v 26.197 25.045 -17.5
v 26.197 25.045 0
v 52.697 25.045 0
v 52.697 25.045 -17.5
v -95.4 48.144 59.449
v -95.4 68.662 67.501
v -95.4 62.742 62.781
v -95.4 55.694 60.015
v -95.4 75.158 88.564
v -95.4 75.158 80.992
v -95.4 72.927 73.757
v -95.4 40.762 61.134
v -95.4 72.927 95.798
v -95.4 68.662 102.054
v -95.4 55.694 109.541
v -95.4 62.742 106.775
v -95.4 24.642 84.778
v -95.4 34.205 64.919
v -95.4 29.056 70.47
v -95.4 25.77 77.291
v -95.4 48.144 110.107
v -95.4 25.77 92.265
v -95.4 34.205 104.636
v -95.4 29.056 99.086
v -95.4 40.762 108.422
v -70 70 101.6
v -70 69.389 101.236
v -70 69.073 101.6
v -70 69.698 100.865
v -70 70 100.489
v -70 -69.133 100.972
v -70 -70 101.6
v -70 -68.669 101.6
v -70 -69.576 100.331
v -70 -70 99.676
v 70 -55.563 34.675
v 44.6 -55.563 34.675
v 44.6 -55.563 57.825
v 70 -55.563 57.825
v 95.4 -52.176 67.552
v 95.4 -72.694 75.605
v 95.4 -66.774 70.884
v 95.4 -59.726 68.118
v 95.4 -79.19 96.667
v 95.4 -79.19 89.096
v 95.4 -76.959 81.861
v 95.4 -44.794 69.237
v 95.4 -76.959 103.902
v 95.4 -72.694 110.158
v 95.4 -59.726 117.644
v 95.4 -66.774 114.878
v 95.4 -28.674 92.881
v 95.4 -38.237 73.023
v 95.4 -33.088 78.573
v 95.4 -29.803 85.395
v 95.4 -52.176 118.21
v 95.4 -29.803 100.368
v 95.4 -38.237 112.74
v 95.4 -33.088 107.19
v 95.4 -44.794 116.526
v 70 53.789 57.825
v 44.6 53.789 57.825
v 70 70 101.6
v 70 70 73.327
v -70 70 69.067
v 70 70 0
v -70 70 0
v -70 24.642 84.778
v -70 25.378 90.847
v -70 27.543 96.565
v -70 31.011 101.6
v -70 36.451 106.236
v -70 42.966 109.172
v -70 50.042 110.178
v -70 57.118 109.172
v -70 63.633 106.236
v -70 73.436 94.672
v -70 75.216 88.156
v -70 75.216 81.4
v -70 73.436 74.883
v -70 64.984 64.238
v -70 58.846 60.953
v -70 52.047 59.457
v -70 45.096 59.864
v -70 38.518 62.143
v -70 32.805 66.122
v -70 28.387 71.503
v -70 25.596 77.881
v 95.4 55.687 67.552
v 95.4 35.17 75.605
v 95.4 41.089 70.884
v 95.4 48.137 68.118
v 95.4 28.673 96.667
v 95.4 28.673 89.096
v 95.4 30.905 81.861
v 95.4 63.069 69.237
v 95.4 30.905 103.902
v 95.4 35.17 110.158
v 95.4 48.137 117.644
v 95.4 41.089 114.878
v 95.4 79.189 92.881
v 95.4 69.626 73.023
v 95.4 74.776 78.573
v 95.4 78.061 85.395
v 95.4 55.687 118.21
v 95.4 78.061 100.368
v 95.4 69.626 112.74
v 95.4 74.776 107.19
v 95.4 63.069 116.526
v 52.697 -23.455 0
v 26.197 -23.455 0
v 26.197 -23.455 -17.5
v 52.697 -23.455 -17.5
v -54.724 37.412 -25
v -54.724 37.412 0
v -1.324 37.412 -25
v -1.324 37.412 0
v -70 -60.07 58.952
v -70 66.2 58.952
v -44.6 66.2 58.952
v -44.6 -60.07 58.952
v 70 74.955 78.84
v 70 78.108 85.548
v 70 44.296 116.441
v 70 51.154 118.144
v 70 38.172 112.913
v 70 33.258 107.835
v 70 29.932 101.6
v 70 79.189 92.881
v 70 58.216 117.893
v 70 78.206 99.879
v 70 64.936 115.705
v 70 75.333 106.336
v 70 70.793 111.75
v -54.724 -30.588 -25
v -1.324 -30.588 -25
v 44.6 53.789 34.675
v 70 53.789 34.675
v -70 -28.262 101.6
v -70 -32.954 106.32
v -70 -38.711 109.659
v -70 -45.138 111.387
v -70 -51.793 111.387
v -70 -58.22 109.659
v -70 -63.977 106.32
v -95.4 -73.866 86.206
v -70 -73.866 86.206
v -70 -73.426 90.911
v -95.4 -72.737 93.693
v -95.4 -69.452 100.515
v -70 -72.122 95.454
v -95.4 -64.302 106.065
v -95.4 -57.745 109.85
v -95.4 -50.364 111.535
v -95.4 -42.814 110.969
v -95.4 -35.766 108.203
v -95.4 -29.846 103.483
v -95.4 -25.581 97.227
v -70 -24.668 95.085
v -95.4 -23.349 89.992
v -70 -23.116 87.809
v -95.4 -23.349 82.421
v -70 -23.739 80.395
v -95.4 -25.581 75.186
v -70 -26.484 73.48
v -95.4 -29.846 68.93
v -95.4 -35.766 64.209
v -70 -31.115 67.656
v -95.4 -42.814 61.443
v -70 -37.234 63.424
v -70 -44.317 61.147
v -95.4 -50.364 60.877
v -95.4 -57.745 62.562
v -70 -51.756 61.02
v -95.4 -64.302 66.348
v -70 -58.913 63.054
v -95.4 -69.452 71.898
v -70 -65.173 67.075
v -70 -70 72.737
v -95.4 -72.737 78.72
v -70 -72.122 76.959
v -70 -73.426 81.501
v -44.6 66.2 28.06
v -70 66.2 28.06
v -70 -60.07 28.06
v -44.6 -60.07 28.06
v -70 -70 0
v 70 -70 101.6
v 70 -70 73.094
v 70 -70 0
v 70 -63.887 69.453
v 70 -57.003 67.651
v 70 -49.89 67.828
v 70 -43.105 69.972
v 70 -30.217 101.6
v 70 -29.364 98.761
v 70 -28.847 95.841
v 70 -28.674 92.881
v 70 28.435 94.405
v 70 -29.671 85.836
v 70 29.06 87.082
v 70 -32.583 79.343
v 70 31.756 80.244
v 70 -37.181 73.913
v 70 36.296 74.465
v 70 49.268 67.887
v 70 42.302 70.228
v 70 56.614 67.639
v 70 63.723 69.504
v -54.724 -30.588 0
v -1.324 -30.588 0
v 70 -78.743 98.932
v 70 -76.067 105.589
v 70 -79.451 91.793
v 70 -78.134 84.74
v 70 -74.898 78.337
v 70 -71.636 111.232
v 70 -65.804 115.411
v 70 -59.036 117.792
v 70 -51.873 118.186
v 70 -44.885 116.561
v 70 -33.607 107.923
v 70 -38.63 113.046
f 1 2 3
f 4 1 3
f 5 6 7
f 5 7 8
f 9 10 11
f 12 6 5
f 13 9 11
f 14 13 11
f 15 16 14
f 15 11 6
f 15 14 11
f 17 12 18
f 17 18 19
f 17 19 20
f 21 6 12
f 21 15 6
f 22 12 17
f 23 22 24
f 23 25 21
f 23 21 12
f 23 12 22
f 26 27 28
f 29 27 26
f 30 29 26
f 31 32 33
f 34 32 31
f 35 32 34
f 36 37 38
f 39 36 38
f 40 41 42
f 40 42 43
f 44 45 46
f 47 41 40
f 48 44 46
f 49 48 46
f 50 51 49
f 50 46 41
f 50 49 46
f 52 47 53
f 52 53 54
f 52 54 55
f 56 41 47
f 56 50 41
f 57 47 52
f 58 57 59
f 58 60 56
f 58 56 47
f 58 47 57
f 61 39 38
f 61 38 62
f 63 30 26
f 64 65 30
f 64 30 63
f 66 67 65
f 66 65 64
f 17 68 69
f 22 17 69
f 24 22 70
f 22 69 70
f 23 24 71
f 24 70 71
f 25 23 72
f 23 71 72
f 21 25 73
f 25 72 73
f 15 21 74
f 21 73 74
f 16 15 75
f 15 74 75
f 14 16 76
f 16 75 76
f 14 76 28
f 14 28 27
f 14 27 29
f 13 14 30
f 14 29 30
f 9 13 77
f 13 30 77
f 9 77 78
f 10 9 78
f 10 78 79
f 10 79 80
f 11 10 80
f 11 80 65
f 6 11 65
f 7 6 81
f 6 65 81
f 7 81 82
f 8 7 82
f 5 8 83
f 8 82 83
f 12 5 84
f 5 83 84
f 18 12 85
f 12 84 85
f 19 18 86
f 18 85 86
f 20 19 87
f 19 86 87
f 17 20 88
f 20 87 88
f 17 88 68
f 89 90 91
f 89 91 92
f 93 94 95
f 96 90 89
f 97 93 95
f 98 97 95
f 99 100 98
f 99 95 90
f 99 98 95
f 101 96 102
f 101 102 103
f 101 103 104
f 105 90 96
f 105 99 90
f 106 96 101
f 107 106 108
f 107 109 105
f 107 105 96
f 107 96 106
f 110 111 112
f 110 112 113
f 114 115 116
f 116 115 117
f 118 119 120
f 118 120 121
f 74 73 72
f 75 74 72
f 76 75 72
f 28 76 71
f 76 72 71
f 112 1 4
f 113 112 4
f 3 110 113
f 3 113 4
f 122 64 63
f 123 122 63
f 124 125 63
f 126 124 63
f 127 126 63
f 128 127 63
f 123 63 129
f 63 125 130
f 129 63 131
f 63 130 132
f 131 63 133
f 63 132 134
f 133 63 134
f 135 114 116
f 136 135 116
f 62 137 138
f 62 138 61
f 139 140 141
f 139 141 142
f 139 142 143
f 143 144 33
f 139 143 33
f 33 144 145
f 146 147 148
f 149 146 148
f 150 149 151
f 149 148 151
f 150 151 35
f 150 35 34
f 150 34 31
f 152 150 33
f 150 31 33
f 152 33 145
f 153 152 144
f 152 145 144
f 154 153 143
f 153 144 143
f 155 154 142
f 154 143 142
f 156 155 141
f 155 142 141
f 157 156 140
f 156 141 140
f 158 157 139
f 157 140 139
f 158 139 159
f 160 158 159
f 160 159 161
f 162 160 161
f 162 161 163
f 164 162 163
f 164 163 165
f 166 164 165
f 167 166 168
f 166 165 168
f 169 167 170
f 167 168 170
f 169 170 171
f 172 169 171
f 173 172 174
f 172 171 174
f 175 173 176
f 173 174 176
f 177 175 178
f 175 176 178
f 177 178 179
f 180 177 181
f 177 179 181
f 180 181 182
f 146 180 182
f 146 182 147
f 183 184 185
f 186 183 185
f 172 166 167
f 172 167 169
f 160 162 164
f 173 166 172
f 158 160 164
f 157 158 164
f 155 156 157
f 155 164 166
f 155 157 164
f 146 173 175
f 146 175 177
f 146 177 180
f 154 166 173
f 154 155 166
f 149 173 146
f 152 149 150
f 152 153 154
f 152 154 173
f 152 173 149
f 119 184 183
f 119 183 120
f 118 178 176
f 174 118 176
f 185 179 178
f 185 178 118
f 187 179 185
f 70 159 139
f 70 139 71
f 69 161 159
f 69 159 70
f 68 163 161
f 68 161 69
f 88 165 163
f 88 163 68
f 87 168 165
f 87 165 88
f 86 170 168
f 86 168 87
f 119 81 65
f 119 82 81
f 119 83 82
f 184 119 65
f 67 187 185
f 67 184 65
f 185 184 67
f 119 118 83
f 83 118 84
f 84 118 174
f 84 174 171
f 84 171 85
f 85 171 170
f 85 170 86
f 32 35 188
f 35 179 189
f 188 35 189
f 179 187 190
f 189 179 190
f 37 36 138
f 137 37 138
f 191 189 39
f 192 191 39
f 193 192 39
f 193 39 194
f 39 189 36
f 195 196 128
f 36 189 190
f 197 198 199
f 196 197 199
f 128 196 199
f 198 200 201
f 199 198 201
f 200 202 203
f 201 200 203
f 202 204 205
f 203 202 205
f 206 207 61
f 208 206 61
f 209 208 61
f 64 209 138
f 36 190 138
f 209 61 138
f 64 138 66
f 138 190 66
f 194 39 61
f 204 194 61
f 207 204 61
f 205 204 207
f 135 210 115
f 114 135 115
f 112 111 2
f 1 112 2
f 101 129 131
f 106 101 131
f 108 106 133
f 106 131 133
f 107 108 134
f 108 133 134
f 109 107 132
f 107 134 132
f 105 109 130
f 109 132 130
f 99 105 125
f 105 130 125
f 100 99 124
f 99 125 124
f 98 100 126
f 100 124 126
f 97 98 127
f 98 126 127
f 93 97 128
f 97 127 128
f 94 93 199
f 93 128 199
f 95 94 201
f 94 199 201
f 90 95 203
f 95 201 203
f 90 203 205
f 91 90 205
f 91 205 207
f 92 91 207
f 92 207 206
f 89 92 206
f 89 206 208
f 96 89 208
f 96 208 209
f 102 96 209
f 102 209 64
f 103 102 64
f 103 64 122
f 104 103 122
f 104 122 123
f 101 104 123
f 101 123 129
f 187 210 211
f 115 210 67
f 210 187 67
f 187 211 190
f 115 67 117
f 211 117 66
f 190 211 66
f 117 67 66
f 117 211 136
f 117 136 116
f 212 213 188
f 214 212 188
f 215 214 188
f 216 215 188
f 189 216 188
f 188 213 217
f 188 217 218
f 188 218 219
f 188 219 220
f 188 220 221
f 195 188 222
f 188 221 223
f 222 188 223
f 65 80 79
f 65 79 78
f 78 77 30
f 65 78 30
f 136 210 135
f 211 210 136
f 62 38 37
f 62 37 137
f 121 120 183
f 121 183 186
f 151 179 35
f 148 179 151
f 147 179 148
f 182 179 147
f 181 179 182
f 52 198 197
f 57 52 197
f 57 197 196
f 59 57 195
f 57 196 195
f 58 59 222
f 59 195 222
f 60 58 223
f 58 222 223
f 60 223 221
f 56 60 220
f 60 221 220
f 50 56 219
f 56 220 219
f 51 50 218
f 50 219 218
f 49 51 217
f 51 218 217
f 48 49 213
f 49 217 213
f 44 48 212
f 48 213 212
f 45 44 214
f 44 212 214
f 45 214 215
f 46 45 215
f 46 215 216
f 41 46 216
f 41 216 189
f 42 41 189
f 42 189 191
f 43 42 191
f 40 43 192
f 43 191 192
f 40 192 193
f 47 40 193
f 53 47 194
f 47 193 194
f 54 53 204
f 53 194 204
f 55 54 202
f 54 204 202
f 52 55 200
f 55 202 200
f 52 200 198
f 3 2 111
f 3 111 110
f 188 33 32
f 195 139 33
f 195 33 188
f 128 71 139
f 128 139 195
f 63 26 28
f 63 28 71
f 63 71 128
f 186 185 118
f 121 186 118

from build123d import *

# Parameters (mm, degrees)
F0_W      = 139.999974
F0_H      = 139.999974
F1_DEPTH  = 101.6
F2_W      = 26.5
F2_H      = 48.5
F4_DEPTH  = 17.5
F3_W      = 53.4
F3_H      = 68
F5_DEPTH  = 25
F6_W      = 109.352451
F6_H      = 23.150146
F7_DEPTH  = 25.4
F8_W      = 126.269319
F8_H      = 30.891789
F9_DEPTH  = 25.4
F10_R     = 25.4
F11_DEPTH = 25.4
F12_R     = 25.4
F13_DEPTH = 25.4


with BuildPart() as f1:
    # F0 (on Top) → F1 (new body)
    with BuildSketch(Plane.XY):
        Rectangle(F0_W, F0_H)
    extrude(amount=F1_DEPTH)

    # F3 (on face) → F5 (join)
    with BuildSketch(Plane.XY):
        with Locations((-28.023809, 3.412007)):
            Rectangle(F3_W, F3_H)
    extrude(amount=-F5_DEPTH)

    # F6 (on face) → F7 (cut)
    with BuildSketch(Plane.YZ.offset(69.999987)):
        with Locations((-0.887072, 46.249717)):
            Rectangle(F6_W, F6_H)
    extrude(amount=-F7_DEPTH, mode=Mode.SUBTRACT)

    # F8 (on face) → F9 (cut)
    with BuildSketch(Plane(origin=(-69.999987, 0, 0), x_dir=(0, -1, 0), z_dir=(-1, 0, 0))):
        with Locations((-3.065023, 43.506295)):
            Rectangle(F8_W, F8_H)
    extrude(amount=-F9_DEPTH, mode=Mode.SUBTRACT)

    # F10 (on face) → F11 (join)
    with BuildSketch(Plane.YZ.offset(69.999987)):
        with Locations((-54.074091, 92.881314)):
            Circle(F10_R)
        with Locations((53.789154, 92.881314)):
            Circle(F10_R)
    extrude(amount=F11_DEPTH)

    # F12 (on face) → F13 (join)
    with BuildSketch(Plane(origin=(-69.999987, 0, 0), x_dir=(0, -1, 0), z_dir=(-1, 0, 0))):
        with Locations((-50.042018, 84.777839)):
            Circle(F12_R)
        with Locations((48.465647, 86.206302)):
            Circle(F12_R)
    extrude(amount=F13_DEPTH)


with BuildPart() as f4:
    # F2 (on face) → F4 (new body)
    with BuildSketch(Plane.XY):
        with Locations((39.446943, 0.795291)):
            Rectangle(F2_W, F2_H)
    extrude(amount=-F4_DEPTH)


solid = Compound([f1.part, f4.part])
